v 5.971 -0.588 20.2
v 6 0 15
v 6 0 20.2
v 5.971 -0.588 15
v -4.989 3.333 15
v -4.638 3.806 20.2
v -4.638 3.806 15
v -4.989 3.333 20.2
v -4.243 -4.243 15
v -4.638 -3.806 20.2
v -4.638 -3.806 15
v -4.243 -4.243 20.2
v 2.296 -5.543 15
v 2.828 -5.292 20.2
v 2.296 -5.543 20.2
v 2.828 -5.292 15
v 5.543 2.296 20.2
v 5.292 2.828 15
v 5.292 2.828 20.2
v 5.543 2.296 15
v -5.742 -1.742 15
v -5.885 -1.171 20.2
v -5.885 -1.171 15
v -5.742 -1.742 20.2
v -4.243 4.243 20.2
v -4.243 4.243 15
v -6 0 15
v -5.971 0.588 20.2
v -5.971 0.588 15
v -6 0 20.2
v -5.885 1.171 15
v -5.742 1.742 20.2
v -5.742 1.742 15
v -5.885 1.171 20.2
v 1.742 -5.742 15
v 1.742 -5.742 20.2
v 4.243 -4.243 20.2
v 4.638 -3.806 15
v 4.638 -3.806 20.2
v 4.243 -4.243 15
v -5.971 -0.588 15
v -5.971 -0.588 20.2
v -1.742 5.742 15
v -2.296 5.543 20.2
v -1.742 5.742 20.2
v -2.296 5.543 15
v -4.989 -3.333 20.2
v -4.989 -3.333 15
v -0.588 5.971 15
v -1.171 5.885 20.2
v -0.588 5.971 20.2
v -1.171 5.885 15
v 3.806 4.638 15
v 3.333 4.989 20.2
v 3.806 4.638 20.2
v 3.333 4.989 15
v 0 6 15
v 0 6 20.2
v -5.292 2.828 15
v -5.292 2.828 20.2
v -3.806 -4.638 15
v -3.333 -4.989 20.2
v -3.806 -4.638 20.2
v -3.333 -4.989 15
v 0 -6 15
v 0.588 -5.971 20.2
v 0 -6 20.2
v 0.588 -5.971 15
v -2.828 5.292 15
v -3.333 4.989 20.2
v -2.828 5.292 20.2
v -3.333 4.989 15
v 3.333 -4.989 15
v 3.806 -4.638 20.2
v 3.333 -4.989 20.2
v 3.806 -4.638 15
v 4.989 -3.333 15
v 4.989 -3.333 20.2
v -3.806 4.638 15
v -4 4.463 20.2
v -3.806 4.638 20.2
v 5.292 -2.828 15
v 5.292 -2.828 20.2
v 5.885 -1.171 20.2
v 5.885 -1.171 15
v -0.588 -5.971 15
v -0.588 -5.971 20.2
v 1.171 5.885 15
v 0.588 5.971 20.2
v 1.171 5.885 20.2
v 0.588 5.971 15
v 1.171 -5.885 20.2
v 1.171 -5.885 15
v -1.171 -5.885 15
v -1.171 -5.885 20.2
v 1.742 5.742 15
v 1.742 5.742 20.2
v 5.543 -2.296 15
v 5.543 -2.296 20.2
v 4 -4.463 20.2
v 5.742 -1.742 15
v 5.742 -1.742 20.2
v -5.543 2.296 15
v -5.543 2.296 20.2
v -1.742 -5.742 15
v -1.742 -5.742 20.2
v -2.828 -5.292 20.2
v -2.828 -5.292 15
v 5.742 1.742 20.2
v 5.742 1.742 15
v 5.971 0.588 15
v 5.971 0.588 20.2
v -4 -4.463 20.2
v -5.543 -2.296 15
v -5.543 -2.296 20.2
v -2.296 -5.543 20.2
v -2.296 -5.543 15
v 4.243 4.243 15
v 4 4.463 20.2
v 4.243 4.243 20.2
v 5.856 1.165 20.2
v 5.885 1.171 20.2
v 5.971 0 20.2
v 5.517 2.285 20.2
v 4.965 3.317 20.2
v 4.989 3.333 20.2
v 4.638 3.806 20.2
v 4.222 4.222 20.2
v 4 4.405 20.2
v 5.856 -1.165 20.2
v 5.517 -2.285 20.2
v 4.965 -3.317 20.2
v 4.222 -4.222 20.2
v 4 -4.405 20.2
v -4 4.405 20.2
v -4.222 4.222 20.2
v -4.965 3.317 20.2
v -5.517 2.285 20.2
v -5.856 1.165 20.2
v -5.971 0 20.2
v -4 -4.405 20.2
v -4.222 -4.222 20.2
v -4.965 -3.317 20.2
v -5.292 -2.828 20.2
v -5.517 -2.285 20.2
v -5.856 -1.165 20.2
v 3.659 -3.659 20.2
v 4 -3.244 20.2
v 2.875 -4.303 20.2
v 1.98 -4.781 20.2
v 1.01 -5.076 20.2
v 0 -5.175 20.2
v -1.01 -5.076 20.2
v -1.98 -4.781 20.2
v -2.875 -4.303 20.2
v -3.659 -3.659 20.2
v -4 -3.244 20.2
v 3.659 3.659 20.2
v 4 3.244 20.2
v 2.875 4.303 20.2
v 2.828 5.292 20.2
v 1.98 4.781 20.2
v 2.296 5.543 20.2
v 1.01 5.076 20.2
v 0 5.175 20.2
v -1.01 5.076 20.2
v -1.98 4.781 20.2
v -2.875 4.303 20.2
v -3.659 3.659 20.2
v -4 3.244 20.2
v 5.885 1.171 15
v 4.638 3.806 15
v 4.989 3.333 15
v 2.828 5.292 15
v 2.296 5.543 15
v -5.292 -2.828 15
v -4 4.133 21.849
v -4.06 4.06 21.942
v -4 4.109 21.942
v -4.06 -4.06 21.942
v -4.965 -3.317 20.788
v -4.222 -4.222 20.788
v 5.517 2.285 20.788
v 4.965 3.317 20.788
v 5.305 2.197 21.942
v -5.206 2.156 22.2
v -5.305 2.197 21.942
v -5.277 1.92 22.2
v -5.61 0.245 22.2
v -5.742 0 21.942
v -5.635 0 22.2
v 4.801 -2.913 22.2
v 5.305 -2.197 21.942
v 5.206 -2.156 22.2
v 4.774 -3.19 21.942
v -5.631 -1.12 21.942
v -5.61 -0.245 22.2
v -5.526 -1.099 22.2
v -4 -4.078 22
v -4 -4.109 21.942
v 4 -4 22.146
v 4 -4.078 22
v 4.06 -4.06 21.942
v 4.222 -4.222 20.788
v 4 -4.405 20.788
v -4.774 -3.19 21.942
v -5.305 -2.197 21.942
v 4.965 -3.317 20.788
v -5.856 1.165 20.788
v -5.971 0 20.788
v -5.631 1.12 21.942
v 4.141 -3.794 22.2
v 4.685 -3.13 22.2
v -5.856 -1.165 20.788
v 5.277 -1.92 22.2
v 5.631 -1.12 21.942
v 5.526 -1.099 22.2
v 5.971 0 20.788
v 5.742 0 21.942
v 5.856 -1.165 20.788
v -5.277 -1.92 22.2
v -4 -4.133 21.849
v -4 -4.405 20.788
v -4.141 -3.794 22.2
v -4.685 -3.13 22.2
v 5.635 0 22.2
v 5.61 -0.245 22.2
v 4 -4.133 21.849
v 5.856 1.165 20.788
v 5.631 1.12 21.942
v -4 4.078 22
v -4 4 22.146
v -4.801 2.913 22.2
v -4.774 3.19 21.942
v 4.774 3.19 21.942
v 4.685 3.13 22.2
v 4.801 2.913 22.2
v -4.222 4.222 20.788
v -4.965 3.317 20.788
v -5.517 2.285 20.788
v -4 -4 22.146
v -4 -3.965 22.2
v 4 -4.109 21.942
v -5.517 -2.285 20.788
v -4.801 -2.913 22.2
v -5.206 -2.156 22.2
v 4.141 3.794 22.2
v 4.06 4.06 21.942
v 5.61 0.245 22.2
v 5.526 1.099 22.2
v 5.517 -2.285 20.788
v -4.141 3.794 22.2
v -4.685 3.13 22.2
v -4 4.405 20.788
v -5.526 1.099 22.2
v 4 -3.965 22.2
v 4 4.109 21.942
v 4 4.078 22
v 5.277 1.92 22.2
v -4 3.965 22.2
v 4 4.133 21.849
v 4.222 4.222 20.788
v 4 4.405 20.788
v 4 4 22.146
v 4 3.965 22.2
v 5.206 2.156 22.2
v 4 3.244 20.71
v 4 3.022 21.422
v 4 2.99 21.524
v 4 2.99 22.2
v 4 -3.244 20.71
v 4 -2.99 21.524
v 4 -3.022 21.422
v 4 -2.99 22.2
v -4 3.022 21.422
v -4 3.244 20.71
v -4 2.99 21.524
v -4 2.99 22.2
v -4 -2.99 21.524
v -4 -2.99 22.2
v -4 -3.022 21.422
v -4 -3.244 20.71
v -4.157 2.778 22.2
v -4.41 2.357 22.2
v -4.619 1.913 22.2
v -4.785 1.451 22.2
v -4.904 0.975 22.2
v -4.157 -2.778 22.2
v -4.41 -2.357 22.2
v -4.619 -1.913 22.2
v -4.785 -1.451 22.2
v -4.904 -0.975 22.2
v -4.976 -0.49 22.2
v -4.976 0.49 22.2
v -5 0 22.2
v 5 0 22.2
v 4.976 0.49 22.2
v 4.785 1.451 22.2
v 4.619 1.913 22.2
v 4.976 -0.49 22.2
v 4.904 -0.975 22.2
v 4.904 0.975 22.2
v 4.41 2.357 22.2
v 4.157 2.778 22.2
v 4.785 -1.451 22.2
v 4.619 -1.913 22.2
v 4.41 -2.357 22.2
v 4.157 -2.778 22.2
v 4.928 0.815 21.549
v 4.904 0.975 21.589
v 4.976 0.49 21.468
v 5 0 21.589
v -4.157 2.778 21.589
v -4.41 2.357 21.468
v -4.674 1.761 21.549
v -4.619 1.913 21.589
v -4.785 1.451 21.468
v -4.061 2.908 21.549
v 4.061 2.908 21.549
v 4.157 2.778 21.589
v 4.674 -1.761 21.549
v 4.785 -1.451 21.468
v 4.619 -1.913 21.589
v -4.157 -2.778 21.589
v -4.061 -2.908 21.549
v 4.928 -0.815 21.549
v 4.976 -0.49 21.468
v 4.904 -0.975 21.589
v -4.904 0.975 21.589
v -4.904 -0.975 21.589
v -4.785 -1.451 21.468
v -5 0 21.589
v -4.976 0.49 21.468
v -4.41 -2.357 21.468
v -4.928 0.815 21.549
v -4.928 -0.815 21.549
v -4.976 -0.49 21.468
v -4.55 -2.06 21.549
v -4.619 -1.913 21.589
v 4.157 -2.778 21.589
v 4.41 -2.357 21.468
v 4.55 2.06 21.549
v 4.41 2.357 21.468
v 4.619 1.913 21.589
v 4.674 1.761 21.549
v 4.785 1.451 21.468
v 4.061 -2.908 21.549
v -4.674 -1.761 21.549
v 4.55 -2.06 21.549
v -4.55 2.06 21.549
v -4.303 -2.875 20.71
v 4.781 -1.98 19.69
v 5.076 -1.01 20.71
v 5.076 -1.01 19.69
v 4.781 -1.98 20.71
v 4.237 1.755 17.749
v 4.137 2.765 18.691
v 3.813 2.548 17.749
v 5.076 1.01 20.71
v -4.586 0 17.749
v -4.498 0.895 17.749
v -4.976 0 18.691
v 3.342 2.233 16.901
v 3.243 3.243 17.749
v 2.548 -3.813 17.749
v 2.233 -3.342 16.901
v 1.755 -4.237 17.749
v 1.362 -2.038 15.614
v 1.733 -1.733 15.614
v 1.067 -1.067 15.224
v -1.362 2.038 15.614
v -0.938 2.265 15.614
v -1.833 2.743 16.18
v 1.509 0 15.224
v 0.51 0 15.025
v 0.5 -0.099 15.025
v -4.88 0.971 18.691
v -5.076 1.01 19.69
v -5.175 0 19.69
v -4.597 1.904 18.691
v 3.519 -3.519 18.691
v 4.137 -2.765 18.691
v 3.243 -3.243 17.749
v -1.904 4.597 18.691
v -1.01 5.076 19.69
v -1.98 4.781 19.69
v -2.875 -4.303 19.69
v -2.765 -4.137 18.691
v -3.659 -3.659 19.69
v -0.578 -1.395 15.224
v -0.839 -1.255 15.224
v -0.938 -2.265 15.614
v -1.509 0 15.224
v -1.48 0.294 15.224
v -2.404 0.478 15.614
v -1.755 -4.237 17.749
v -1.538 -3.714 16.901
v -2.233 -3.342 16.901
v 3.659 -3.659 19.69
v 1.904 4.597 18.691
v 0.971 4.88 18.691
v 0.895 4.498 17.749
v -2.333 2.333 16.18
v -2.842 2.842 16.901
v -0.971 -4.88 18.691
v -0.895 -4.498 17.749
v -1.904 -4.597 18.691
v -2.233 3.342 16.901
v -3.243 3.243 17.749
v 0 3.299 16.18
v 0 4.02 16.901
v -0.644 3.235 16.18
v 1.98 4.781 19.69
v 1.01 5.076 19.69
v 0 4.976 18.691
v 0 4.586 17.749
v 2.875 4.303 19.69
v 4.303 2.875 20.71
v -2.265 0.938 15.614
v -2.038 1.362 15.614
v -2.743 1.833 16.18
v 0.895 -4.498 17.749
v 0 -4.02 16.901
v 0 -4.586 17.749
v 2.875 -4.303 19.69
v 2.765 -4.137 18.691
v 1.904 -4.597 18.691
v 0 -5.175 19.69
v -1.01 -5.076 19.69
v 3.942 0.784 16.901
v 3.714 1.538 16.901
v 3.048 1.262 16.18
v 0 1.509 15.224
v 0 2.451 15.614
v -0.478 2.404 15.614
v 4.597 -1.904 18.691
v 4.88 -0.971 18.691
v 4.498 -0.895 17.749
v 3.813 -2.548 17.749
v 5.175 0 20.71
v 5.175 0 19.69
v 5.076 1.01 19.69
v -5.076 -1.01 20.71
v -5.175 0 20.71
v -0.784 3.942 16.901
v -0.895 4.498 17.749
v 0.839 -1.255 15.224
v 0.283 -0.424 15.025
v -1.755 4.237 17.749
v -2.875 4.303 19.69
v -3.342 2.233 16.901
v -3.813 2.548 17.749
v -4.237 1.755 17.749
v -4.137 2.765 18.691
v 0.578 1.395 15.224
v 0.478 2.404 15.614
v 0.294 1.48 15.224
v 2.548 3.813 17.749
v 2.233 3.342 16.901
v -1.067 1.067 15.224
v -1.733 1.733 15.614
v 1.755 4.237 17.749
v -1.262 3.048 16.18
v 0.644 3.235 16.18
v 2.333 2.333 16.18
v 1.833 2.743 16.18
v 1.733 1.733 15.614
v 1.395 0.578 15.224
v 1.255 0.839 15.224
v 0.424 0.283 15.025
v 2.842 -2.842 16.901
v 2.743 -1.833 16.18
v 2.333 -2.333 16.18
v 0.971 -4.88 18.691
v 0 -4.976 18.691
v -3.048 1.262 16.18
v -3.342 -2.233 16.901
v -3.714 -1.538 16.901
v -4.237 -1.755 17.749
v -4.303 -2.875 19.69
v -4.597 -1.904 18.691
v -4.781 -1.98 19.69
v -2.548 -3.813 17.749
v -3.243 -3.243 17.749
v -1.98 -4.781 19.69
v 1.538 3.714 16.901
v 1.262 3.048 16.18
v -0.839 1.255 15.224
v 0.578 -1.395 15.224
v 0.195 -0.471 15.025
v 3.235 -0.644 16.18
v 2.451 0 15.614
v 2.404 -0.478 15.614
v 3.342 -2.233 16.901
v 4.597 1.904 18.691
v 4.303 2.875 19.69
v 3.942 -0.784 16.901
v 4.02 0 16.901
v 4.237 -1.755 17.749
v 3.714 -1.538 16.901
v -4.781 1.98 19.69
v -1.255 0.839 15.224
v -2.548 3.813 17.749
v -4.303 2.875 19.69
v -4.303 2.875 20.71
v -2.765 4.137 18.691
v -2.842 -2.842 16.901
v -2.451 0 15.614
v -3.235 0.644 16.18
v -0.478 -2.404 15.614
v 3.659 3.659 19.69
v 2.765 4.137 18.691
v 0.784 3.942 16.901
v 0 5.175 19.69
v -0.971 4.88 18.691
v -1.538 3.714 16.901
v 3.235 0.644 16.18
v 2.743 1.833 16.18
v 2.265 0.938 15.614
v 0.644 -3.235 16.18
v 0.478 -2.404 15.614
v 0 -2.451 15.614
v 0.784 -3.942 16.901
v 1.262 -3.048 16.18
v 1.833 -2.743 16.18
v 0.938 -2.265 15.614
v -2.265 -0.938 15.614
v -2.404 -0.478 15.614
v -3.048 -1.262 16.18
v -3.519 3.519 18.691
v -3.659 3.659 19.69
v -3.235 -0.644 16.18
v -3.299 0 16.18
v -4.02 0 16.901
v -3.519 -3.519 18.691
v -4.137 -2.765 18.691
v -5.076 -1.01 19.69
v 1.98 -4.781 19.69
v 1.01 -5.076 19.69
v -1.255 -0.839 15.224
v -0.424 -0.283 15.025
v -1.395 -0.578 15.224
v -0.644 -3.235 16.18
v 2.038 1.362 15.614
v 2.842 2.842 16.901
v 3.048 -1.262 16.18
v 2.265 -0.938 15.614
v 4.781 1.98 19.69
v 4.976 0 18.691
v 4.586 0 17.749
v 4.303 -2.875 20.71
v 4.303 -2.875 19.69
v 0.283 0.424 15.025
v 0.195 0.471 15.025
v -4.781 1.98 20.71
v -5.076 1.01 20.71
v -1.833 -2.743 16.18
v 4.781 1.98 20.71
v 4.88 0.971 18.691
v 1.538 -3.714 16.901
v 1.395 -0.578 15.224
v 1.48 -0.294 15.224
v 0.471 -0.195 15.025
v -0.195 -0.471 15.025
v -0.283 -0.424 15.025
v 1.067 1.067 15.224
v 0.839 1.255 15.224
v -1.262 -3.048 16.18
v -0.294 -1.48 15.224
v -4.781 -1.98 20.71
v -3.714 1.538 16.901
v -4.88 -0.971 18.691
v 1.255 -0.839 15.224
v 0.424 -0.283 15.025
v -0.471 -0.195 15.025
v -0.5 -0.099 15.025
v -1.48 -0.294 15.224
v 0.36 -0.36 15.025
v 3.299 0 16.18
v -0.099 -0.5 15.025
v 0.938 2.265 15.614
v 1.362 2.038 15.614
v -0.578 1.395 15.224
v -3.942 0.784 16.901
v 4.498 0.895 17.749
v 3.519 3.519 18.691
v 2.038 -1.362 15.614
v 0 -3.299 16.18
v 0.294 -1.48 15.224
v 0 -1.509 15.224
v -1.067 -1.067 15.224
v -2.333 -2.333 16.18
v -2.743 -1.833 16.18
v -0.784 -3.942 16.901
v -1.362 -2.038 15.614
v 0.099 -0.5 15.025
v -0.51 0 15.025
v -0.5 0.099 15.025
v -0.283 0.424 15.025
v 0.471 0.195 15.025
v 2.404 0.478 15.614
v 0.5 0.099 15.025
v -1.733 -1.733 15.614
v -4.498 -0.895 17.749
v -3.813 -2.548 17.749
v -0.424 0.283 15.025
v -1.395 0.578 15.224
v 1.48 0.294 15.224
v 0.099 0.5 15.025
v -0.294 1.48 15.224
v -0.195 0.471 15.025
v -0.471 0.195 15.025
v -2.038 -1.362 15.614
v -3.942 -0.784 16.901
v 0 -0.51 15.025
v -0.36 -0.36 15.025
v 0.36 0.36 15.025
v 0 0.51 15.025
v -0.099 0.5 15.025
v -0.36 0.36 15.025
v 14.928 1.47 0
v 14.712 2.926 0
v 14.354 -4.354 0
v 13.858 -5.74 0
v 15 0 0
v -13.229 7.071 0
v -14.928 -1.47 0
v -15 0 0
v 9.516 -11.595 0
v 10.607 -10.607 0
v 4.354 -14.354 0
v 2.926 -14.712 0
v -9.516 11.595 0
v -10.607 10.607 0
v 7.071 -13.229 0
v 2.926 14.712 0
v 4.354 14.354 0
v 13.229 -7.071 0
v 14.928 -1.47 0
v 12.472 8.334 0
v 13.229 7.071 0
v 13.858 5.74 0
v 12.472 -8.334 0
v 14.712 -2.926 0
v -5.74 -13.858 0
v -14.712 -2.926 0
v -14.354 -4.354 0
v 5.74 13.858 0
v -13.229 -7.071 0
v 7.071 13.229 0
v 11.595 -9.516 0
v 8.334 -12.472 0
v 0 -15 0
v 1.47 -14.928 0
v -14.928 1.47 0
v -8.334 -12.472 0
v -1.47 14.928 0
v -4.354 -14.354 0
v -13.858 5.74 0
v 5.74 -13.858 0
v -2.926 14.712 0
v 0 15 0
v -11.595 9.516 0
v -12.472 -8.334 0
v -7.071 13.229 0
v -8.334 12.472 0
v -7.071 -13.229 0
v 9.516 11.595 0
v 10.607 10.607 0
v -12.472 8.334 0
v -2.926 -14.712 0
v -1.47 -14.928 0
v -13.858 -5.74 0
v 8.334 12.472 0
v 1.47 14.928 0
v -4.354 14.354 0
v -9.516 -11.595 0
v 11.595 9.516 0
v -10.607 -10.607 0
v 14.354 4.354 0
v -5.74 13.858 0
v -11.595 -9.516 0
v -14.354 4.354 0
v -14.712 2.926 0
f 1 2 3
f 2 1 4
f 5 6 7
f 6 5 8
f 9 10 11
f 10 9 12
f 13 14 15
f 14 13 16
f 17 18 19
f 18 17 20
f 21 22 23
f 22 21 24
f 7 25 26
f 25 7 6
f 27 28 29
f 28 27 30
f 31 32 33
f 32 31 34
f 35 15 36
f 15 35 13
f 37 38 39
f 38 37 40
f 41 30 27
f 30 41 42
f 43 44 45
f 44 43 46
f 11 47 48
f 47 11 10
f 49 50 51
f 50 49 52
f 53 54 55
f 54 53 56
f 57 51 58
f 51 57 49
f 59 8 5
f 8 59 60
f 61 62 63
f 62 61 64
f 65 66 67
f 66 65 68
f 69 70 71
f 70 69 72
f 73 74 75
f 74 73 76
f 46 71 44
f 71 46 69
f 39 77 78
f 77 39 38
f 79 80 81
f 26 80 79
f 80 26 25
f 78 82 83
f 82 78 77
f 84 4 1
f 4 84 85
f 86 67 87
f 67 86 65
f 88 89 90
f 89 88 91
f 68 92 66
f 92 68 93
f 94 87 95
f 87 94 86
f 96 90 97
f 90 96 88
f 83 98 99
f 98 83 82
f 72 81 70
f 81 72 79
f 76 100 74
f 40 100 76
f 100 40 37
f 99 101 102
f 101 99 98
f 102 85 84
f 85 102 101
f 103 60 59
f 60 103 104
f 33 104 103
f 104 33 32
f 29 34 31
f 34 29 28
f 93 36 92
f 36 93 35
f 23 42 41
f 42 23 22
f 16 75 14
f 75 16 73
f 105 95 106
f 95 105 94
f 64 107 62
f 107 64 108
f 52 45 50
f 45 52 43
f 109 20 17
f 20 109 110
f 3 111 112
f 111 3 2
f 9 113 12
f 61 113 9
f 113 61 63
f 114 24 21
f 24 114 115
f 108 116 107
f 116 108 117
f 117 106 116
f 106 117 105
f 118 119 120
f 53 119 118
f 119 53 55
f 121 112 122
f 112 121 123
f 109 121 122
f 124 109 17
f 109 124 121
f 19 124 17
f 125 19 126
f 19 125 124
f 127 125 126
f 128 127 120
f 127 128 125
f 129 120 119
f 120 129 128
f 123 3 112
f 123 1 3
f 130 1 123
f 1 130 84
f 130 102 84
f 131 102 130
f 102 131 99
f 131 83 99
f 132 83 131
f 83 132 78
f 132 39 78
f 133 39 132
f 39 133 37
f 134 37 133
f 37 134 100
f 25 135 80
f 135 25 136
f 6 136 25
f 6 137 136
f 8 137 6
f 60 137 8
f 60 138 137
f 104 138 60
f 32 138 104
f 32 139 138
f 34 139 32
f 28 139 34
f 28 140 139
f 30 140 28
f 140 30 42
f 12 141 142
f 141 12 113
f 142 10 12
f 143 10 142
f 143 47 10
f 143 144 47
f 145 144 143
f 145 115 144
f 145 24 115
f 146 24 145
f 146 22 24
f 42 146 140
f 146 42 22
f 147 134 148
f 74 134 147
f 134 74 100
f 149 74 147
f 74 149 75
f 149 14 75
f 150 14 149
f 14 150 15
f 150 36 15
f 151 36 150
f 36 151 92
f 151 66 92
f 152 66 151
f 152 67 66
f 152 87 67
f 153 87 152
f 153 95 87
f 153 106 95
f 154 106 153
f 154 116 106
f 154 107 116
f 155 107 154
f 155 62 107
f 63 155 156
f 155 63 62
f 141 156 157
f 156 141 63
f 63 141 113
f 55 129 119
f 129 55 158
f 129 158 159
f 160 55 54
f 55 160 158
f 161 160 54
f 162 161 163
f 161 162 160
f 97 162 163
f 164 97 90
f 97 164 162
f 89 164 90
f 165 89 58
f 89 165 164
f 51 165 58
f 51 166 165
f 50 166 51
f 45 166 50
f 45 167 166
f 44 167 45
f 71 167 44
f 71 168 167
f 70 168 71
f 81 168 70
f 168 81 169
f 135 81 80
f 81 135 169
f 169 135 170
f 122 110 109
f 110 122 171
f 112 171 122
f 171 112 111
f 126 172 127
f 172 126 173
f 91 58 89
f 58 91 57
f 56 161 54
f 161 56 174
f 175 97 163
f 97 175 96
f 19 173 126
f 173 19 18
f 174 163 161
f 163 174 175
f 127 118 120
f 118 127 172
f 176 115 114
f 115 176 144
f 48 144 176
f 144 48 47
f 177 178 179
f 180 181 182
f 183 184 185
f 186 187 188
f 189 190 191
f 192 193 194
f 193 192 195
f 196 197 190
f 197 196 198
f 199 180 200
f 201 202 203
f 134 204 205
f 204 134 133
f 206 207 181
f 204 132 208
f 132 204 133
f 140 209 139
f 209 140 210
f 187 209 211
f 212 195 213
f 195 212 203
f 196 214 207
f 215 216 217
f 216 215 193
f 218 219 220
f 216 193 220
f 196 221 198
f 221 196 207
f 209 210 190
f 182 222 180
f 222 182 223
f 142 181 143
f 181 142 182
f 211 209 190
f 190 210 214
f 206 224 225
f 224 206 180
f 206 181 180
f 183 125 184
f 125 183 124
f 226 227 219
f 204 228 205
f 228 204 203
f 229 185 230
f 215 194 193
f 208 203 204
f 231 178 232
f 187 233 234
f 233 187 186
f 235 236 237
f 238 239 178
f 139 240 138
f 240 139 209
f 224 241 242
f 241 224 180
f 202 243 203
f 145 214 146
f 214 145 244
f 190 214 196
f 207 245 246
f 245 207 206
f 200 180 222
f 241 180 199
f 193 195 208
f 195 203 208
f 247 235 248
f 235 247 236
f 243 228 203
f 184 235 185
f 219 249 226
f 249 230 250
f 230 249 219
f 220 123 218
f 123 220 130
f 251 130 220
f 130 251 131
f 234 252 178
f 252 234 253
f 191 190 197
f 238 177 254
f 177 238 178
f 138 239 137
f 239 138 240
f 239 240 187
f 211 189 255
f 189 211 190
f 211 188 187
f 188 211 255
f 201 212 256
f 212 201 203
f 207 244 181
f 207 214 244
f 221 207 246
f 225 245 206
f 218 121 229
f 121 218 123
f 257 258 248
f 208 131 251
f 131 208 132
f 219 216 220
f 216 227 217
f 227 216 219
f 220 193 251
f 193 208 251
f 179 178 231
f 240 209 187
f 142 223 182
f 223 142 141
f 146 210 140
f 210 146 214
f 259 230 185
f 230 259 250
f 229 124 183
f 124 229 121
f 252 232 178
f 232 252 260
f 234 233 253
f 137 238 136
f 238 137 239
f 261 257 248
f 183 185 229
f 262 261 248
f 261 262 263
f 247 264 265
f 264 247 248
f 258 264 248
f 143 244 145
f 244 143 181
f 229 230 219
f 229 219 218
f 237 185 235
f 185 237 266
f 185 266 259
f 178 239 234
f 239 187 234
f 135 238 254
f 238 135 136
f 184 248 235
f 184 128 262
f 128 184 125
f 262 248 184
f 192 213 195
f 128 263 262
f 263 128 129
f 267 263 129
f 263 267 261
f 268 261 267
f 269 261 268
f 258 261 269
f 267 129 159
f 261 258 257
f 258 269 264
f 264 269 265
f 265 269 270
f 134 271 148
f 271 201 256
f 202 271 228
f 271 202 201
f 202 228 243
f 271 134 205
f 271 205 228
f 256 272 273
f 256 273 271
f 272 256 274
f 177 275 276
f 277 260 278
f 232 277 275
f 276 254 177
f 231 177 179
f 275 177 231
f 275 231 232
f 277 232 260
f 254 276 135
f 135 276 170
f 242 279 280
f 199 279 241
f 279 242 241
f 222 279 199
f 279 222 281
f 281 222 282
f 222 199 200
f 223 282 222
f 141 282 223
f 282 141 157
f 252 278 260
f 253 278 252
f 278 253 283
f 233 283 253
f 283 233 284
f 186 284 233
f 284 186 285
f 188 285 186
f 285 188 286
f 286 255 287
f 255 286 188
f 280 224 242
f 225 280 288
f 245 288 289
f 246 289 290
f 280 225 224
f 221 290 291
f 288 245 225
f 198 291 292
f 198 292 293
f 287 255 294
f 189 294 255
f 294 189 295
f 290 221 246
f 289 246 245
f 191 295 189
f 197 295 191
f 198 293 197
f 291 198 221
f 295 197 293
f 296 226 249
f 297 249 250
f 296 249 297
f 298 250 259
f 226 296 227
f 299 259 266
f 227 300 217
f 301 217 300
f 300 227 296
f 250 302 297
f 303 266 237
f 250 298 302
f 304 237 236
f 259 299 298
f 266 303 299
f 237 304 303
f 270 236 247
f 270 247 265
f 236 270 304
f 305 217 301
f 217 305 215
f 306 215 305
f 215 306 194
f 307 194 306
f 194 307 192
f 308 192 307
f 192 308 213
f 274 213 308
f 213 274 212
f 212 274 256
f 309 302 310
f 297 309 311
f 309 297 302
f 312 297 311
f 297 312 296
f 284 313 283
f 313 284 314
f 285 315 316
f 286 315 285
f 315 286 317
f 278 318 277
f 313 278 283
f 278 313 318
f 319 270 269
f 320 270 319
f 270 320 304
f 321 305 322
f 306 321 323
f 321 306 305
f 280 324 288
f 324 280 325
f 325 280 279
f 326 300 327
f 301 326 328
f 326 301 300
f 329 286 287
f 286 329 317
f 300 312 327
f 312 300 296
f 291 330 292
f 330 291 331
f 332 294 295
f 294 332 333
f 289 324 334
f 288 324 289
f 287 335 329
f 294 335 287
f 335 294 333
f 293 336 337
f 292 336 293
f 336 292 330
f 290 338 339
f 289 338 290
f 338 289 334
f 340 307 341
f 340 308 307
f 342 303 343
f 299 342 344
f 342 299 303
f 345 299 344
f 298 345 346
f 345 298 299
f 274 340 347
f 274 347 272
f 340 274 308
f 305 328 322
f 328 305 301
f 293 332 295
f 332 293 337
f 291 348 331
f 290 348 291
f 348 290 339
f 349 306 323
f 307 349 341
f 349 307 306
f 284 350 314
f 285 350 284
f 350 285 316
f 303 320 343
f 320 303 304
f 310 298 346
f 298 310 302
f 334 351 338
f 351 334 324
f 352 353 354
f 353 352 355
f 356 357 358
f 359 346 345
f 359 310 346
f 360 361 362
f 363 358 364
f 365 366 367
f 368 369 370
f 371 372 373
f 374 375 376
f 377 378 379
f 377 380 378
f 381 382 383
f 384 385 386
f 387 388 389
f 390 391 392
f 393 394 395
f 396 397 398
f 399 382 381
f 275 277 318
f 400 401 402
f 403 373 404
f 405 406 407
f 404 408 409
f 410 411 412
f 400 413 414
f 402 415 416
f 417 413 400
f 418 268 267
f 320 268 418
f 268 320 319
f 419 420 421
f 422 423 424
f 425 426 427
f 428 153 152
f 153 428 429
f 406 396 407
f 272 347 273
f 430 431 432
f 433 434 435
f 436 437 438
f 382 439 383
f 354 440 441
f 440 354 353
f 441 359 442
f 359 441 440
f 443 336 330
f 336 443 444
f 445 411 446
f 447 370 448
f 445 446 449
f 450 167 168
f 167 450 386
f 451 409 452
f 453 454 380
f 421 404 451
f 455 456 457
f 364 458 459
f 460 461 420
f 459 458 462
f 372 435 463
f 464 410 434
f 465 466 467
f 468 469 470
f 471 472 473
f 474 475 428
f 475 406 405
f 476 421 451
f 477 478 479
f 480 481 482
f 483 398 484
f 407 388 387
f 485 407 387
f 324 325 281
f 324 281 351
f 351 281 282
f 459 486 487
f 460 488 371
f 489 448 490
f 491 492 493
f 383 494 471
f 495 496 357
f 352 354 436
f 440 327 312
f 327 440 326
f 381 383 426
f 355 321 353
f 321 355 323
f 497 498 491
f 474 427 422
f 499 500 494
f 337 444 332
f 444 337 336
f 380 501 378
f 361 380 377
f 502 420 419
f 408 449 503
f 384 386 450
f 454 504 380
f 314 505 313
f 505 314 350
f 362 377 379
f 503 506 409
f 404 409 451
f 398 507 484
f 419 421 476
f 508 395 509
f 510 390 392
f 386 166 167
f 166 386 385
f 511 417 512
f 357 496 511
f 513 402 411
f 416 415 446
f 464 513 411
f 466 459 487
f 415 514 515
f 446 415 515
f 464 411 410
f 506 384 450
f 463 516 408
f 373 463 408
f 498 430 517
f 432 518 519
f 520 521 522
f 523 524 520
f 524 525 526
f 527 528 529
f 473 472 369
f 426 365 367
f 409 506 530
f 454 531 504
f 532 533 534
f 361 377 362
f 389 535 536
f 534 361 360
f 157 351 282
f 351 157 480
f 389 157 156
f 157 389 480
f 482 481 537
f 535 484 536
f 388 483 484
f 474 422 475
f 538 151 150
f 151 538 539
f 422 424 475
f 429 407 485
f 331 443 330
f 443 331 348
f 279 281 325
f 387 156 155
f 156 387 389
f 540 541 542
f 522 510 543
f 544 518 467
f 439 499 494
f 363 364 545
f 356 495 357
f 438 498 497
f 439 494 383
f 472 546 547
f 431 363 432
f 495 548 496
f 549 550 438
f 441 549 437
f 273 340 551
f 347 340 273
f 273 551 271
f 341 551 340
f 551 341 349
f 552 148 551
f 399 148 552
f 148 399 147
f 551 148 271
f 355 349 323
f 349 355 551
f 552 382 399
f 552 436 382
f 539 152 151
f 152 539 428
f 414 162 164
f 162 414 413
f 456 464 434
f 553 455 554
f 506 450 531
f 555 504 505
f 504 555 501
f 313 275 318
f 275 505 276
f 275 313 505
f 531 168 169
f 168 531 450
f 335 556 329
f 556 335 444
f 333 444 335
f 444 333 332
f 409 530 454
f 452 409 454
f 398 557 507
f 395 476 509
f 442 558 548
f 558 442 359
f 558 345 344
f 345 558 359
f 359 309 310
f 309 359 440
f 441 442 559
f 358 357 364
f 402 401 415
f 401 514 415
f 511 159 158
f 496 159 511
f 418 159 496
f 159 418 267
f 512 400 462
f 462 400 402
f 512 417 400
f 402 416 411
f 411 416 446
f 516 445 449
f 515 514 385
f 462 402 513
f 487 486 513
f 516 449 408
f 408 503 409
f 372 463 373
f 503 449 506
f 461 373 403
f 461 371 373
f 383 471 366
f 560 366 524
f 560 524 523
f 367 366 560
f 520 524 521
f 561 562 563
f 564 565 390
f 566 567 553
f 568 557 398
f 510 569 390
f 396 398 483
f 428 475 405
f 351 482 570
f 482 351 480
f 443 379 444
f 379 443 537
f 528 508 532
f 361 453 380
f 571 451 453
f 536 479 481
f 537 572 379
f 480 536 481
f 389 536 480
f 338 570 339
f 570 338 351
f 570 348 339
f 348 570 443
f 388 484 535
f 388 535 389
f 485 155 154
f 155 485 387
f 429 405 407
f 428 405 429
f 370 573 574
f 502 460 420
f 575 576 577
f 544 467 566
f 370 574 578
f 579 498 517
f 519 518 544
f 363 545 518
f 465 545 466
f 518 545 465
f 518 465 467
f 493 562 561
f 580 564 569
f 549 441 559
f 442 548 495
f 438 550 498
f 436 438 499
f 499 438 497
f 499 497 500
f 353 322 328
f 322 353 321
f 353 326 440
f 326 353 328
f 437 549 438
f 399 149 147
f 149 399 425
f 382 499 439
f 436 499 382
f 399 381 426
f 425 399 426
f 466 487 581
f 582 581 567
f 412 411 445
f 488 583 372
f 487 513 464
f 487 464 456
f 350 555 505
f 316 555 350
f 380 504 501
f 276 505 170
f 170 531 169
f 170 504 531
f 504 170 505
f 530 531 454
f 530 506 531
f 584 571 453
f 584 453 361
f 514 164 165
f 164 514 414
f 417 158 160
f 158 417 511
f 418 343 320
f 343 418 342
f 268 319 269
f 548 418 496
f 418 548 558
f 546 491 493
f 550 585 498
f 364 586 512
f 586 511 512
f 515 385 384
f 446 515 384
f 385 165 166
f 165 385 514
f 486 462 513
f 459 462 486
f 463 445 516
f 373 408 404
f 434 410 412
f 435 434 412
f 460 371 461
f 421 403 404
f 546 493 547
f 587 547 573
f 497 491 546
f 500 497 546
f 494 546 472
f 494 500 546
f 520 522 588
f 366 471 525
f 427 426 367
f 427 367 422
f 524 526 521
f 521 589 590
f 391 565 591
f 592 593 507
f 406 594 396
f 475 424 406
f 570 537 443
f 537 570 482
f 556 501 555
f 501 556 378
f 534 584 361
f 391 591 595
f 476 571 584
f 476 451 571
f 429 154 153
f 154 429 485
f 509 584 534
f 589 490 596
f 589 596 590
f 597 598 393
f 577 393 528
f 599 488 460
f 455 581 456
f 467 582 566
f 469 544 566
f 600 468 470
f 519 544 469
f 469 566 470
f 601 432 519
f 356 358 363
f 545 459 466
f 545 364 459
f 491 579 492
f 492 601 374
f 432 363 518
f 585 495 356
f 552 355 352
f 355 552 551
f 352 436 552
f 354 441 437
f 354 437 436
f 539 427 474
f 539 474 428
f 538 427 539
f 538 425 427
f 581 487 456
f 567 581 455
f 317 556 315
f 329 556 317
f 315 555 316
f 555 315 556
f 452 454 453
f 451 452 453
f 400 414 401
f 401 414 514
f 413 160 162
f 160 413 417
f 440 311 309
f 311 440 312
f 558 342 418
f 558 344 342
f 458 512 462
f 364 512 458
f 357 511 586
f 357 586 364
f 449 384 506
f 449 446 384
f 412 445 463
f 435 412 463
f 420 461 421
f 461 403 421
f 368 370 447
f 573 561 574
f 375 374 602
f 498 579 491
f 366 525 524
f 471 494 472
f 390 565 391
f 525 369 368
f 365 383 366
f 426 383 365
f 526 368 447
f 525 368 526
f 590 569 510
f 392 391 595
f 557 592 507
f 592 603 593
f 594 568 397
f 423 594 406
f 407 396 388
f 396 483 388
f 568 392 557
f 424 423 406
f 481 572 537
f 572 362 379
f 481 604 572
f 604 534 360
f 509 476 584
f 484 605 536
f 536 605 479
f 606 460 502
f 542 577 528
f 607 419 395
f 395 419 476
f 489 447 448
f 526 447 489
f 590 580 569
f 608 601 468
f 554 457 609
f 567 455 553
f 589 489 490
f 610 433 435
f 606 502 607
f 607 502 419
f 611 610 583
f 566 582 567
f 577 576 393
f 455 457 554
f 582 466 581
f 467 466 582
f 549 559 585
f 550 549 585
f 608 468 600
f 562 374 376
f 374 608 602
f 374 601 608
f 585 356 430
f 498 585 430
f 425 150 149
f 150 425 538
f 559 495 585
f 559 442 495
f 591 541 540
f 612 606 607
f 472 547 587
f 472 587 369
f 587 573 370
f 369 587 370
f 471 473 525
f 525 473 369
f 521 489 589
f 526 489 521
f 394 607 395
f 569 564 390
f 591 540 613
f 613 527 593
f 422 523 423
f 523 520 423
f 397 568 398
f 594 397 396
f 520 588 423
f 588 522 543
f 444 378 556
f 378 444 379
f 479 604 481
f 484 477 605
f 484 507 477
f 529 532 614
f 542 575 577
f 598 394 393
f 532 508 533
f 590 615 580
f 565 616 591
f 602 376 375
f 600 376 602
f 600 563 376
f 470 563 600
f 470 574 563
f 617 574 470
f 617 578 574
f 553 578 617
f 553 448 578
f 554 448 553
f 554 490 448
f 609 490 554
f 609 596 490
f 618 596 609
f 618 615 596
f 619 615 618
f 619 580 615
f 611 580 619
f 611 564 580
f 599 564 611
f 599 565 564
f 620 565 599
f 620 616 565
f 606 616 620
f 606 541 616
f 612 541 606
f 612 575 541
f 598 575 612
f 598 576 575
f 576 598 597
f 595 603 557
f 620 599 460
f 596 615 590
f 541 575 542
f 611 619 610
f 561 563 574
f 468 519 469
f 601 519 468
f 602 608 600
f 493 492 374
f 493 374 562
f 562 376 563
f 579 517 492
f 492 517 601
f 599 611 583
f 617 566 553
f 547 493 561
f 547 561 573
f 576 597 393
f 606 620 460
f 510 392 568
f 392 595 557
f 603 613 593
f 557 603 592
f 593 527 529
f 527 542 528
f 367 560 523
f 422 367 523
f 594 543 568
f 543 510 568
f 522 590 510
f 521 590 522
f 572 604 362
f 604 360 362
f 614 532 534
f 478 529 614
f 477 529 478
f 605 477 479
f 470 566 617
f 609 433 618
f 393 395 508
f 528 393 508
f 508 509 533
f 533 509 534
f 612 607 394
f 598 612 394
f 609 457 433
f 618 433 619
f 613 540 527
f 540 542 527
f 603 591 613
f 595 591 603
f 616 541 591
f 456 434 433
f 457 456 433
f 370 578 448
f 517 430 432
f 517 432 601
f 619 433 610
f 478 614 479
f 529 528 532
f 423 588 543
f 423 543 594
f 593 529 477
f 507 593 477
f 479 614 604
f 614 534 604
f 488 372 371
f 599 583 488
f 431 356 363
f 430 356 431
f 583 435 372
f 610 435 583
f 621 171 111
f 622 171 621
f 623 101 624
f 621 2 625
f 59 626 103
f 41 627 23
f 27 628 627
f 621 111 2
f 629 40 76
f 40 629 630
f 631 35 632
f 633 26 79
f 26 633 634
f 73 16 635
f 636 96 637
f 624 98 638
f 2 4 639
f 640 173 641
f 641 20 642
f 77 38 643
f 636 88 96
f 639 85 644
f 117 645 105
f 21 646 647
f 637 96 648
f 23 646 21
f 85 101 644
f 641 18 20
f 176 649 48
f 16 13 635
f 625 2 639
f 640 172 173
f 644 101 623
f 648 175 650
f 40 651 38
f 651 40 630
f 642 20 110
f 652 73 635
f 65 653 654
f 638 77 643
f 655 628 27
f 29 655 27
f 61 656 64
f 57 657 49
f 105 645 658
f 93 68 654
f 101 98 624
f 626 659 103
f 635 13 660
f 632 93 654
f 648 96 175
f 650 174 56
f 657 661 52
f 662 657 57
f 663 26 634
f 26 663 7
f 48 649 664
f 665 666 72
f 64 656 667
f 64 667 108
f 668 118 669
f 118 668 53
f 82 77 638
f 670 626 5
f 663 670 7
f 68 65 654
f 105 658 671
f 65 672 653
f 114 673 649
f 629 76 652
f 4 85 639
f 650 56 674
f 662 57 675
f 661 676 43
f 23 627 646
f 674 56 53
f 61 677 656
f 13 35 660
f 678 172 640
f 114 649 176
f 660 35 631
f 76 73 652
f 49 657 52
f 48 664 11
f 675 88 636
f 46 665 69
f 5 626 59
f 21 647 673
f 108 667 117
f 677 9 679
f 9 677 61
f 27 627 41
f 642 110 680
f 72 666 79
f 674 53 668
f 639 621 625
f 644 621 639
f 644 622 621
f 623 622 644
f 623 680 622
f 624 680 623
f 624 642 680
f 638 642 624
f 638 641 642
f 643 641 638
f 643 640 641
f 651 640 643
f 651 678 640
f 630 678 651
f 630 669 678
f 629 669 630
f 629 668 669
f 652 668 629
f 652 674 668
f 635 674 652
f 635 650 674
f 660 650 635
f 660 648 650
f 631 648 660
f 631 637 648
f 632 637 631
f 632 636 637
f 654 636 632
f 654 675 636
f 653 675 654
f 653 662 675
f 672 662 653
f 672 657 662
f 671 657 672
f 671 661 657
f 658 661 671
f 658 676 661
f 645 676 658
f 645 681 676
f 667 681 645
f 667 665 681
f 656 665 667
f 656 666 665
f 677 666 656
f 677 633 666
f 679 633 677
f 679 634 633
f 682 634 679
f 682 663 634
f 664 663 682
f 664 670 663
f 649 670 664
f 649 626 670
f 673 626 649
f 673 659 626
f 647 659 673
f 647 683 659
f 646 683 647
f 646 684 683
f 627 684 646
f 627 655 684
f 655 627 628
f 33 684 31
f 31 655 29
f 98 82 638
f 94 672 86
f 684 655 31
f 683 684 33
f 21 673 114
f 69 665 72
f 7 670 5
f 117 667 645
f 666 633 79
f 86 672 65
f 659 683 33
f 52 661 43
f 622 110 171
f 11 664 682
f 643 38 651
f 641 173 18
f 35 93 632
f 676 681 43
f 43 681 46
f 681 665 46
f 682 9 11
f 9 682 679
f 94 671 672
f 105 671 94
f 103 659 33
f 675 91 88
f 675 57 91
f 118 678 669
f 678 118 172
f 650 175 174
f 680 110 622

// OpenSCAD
// Ergodox stand feet radius
$feetradius = 5.2;

// Radius of the base of the object
$baseradius = 15;

// Height increase
$height = 15;

// Wall size for the grip
$wall = 0.8;

translate([0,0,$feetradius+$height])
difference() {
    union() {
        translate([0,0,-$feetradius-$wall])
        linear_extrude($feetradius+$wall)
        circle($feetradius+$wall, center=true, $fn=64);

        sphere($feetradius+$wall, $fn=32);
    }

    union() {
        translate([0,0,5])
        union() {
            cube([8, ($feetradius+$wall)*2, 10], center=true);
        }

        translate([0,0,2])
        linear_extrude(100)
        circle($feetradius+$wall, center=true, $fn=64);

        linear_extrude(100)
        circle($feetradius-0.2, center=true, $fn=64);
        sphere($feetradius, $fn=32);
    }
}

linear_extrude($height, scale=($feetradius+$wall)/$baseradius)
circle($baseradius, center=true, $fn=64);
